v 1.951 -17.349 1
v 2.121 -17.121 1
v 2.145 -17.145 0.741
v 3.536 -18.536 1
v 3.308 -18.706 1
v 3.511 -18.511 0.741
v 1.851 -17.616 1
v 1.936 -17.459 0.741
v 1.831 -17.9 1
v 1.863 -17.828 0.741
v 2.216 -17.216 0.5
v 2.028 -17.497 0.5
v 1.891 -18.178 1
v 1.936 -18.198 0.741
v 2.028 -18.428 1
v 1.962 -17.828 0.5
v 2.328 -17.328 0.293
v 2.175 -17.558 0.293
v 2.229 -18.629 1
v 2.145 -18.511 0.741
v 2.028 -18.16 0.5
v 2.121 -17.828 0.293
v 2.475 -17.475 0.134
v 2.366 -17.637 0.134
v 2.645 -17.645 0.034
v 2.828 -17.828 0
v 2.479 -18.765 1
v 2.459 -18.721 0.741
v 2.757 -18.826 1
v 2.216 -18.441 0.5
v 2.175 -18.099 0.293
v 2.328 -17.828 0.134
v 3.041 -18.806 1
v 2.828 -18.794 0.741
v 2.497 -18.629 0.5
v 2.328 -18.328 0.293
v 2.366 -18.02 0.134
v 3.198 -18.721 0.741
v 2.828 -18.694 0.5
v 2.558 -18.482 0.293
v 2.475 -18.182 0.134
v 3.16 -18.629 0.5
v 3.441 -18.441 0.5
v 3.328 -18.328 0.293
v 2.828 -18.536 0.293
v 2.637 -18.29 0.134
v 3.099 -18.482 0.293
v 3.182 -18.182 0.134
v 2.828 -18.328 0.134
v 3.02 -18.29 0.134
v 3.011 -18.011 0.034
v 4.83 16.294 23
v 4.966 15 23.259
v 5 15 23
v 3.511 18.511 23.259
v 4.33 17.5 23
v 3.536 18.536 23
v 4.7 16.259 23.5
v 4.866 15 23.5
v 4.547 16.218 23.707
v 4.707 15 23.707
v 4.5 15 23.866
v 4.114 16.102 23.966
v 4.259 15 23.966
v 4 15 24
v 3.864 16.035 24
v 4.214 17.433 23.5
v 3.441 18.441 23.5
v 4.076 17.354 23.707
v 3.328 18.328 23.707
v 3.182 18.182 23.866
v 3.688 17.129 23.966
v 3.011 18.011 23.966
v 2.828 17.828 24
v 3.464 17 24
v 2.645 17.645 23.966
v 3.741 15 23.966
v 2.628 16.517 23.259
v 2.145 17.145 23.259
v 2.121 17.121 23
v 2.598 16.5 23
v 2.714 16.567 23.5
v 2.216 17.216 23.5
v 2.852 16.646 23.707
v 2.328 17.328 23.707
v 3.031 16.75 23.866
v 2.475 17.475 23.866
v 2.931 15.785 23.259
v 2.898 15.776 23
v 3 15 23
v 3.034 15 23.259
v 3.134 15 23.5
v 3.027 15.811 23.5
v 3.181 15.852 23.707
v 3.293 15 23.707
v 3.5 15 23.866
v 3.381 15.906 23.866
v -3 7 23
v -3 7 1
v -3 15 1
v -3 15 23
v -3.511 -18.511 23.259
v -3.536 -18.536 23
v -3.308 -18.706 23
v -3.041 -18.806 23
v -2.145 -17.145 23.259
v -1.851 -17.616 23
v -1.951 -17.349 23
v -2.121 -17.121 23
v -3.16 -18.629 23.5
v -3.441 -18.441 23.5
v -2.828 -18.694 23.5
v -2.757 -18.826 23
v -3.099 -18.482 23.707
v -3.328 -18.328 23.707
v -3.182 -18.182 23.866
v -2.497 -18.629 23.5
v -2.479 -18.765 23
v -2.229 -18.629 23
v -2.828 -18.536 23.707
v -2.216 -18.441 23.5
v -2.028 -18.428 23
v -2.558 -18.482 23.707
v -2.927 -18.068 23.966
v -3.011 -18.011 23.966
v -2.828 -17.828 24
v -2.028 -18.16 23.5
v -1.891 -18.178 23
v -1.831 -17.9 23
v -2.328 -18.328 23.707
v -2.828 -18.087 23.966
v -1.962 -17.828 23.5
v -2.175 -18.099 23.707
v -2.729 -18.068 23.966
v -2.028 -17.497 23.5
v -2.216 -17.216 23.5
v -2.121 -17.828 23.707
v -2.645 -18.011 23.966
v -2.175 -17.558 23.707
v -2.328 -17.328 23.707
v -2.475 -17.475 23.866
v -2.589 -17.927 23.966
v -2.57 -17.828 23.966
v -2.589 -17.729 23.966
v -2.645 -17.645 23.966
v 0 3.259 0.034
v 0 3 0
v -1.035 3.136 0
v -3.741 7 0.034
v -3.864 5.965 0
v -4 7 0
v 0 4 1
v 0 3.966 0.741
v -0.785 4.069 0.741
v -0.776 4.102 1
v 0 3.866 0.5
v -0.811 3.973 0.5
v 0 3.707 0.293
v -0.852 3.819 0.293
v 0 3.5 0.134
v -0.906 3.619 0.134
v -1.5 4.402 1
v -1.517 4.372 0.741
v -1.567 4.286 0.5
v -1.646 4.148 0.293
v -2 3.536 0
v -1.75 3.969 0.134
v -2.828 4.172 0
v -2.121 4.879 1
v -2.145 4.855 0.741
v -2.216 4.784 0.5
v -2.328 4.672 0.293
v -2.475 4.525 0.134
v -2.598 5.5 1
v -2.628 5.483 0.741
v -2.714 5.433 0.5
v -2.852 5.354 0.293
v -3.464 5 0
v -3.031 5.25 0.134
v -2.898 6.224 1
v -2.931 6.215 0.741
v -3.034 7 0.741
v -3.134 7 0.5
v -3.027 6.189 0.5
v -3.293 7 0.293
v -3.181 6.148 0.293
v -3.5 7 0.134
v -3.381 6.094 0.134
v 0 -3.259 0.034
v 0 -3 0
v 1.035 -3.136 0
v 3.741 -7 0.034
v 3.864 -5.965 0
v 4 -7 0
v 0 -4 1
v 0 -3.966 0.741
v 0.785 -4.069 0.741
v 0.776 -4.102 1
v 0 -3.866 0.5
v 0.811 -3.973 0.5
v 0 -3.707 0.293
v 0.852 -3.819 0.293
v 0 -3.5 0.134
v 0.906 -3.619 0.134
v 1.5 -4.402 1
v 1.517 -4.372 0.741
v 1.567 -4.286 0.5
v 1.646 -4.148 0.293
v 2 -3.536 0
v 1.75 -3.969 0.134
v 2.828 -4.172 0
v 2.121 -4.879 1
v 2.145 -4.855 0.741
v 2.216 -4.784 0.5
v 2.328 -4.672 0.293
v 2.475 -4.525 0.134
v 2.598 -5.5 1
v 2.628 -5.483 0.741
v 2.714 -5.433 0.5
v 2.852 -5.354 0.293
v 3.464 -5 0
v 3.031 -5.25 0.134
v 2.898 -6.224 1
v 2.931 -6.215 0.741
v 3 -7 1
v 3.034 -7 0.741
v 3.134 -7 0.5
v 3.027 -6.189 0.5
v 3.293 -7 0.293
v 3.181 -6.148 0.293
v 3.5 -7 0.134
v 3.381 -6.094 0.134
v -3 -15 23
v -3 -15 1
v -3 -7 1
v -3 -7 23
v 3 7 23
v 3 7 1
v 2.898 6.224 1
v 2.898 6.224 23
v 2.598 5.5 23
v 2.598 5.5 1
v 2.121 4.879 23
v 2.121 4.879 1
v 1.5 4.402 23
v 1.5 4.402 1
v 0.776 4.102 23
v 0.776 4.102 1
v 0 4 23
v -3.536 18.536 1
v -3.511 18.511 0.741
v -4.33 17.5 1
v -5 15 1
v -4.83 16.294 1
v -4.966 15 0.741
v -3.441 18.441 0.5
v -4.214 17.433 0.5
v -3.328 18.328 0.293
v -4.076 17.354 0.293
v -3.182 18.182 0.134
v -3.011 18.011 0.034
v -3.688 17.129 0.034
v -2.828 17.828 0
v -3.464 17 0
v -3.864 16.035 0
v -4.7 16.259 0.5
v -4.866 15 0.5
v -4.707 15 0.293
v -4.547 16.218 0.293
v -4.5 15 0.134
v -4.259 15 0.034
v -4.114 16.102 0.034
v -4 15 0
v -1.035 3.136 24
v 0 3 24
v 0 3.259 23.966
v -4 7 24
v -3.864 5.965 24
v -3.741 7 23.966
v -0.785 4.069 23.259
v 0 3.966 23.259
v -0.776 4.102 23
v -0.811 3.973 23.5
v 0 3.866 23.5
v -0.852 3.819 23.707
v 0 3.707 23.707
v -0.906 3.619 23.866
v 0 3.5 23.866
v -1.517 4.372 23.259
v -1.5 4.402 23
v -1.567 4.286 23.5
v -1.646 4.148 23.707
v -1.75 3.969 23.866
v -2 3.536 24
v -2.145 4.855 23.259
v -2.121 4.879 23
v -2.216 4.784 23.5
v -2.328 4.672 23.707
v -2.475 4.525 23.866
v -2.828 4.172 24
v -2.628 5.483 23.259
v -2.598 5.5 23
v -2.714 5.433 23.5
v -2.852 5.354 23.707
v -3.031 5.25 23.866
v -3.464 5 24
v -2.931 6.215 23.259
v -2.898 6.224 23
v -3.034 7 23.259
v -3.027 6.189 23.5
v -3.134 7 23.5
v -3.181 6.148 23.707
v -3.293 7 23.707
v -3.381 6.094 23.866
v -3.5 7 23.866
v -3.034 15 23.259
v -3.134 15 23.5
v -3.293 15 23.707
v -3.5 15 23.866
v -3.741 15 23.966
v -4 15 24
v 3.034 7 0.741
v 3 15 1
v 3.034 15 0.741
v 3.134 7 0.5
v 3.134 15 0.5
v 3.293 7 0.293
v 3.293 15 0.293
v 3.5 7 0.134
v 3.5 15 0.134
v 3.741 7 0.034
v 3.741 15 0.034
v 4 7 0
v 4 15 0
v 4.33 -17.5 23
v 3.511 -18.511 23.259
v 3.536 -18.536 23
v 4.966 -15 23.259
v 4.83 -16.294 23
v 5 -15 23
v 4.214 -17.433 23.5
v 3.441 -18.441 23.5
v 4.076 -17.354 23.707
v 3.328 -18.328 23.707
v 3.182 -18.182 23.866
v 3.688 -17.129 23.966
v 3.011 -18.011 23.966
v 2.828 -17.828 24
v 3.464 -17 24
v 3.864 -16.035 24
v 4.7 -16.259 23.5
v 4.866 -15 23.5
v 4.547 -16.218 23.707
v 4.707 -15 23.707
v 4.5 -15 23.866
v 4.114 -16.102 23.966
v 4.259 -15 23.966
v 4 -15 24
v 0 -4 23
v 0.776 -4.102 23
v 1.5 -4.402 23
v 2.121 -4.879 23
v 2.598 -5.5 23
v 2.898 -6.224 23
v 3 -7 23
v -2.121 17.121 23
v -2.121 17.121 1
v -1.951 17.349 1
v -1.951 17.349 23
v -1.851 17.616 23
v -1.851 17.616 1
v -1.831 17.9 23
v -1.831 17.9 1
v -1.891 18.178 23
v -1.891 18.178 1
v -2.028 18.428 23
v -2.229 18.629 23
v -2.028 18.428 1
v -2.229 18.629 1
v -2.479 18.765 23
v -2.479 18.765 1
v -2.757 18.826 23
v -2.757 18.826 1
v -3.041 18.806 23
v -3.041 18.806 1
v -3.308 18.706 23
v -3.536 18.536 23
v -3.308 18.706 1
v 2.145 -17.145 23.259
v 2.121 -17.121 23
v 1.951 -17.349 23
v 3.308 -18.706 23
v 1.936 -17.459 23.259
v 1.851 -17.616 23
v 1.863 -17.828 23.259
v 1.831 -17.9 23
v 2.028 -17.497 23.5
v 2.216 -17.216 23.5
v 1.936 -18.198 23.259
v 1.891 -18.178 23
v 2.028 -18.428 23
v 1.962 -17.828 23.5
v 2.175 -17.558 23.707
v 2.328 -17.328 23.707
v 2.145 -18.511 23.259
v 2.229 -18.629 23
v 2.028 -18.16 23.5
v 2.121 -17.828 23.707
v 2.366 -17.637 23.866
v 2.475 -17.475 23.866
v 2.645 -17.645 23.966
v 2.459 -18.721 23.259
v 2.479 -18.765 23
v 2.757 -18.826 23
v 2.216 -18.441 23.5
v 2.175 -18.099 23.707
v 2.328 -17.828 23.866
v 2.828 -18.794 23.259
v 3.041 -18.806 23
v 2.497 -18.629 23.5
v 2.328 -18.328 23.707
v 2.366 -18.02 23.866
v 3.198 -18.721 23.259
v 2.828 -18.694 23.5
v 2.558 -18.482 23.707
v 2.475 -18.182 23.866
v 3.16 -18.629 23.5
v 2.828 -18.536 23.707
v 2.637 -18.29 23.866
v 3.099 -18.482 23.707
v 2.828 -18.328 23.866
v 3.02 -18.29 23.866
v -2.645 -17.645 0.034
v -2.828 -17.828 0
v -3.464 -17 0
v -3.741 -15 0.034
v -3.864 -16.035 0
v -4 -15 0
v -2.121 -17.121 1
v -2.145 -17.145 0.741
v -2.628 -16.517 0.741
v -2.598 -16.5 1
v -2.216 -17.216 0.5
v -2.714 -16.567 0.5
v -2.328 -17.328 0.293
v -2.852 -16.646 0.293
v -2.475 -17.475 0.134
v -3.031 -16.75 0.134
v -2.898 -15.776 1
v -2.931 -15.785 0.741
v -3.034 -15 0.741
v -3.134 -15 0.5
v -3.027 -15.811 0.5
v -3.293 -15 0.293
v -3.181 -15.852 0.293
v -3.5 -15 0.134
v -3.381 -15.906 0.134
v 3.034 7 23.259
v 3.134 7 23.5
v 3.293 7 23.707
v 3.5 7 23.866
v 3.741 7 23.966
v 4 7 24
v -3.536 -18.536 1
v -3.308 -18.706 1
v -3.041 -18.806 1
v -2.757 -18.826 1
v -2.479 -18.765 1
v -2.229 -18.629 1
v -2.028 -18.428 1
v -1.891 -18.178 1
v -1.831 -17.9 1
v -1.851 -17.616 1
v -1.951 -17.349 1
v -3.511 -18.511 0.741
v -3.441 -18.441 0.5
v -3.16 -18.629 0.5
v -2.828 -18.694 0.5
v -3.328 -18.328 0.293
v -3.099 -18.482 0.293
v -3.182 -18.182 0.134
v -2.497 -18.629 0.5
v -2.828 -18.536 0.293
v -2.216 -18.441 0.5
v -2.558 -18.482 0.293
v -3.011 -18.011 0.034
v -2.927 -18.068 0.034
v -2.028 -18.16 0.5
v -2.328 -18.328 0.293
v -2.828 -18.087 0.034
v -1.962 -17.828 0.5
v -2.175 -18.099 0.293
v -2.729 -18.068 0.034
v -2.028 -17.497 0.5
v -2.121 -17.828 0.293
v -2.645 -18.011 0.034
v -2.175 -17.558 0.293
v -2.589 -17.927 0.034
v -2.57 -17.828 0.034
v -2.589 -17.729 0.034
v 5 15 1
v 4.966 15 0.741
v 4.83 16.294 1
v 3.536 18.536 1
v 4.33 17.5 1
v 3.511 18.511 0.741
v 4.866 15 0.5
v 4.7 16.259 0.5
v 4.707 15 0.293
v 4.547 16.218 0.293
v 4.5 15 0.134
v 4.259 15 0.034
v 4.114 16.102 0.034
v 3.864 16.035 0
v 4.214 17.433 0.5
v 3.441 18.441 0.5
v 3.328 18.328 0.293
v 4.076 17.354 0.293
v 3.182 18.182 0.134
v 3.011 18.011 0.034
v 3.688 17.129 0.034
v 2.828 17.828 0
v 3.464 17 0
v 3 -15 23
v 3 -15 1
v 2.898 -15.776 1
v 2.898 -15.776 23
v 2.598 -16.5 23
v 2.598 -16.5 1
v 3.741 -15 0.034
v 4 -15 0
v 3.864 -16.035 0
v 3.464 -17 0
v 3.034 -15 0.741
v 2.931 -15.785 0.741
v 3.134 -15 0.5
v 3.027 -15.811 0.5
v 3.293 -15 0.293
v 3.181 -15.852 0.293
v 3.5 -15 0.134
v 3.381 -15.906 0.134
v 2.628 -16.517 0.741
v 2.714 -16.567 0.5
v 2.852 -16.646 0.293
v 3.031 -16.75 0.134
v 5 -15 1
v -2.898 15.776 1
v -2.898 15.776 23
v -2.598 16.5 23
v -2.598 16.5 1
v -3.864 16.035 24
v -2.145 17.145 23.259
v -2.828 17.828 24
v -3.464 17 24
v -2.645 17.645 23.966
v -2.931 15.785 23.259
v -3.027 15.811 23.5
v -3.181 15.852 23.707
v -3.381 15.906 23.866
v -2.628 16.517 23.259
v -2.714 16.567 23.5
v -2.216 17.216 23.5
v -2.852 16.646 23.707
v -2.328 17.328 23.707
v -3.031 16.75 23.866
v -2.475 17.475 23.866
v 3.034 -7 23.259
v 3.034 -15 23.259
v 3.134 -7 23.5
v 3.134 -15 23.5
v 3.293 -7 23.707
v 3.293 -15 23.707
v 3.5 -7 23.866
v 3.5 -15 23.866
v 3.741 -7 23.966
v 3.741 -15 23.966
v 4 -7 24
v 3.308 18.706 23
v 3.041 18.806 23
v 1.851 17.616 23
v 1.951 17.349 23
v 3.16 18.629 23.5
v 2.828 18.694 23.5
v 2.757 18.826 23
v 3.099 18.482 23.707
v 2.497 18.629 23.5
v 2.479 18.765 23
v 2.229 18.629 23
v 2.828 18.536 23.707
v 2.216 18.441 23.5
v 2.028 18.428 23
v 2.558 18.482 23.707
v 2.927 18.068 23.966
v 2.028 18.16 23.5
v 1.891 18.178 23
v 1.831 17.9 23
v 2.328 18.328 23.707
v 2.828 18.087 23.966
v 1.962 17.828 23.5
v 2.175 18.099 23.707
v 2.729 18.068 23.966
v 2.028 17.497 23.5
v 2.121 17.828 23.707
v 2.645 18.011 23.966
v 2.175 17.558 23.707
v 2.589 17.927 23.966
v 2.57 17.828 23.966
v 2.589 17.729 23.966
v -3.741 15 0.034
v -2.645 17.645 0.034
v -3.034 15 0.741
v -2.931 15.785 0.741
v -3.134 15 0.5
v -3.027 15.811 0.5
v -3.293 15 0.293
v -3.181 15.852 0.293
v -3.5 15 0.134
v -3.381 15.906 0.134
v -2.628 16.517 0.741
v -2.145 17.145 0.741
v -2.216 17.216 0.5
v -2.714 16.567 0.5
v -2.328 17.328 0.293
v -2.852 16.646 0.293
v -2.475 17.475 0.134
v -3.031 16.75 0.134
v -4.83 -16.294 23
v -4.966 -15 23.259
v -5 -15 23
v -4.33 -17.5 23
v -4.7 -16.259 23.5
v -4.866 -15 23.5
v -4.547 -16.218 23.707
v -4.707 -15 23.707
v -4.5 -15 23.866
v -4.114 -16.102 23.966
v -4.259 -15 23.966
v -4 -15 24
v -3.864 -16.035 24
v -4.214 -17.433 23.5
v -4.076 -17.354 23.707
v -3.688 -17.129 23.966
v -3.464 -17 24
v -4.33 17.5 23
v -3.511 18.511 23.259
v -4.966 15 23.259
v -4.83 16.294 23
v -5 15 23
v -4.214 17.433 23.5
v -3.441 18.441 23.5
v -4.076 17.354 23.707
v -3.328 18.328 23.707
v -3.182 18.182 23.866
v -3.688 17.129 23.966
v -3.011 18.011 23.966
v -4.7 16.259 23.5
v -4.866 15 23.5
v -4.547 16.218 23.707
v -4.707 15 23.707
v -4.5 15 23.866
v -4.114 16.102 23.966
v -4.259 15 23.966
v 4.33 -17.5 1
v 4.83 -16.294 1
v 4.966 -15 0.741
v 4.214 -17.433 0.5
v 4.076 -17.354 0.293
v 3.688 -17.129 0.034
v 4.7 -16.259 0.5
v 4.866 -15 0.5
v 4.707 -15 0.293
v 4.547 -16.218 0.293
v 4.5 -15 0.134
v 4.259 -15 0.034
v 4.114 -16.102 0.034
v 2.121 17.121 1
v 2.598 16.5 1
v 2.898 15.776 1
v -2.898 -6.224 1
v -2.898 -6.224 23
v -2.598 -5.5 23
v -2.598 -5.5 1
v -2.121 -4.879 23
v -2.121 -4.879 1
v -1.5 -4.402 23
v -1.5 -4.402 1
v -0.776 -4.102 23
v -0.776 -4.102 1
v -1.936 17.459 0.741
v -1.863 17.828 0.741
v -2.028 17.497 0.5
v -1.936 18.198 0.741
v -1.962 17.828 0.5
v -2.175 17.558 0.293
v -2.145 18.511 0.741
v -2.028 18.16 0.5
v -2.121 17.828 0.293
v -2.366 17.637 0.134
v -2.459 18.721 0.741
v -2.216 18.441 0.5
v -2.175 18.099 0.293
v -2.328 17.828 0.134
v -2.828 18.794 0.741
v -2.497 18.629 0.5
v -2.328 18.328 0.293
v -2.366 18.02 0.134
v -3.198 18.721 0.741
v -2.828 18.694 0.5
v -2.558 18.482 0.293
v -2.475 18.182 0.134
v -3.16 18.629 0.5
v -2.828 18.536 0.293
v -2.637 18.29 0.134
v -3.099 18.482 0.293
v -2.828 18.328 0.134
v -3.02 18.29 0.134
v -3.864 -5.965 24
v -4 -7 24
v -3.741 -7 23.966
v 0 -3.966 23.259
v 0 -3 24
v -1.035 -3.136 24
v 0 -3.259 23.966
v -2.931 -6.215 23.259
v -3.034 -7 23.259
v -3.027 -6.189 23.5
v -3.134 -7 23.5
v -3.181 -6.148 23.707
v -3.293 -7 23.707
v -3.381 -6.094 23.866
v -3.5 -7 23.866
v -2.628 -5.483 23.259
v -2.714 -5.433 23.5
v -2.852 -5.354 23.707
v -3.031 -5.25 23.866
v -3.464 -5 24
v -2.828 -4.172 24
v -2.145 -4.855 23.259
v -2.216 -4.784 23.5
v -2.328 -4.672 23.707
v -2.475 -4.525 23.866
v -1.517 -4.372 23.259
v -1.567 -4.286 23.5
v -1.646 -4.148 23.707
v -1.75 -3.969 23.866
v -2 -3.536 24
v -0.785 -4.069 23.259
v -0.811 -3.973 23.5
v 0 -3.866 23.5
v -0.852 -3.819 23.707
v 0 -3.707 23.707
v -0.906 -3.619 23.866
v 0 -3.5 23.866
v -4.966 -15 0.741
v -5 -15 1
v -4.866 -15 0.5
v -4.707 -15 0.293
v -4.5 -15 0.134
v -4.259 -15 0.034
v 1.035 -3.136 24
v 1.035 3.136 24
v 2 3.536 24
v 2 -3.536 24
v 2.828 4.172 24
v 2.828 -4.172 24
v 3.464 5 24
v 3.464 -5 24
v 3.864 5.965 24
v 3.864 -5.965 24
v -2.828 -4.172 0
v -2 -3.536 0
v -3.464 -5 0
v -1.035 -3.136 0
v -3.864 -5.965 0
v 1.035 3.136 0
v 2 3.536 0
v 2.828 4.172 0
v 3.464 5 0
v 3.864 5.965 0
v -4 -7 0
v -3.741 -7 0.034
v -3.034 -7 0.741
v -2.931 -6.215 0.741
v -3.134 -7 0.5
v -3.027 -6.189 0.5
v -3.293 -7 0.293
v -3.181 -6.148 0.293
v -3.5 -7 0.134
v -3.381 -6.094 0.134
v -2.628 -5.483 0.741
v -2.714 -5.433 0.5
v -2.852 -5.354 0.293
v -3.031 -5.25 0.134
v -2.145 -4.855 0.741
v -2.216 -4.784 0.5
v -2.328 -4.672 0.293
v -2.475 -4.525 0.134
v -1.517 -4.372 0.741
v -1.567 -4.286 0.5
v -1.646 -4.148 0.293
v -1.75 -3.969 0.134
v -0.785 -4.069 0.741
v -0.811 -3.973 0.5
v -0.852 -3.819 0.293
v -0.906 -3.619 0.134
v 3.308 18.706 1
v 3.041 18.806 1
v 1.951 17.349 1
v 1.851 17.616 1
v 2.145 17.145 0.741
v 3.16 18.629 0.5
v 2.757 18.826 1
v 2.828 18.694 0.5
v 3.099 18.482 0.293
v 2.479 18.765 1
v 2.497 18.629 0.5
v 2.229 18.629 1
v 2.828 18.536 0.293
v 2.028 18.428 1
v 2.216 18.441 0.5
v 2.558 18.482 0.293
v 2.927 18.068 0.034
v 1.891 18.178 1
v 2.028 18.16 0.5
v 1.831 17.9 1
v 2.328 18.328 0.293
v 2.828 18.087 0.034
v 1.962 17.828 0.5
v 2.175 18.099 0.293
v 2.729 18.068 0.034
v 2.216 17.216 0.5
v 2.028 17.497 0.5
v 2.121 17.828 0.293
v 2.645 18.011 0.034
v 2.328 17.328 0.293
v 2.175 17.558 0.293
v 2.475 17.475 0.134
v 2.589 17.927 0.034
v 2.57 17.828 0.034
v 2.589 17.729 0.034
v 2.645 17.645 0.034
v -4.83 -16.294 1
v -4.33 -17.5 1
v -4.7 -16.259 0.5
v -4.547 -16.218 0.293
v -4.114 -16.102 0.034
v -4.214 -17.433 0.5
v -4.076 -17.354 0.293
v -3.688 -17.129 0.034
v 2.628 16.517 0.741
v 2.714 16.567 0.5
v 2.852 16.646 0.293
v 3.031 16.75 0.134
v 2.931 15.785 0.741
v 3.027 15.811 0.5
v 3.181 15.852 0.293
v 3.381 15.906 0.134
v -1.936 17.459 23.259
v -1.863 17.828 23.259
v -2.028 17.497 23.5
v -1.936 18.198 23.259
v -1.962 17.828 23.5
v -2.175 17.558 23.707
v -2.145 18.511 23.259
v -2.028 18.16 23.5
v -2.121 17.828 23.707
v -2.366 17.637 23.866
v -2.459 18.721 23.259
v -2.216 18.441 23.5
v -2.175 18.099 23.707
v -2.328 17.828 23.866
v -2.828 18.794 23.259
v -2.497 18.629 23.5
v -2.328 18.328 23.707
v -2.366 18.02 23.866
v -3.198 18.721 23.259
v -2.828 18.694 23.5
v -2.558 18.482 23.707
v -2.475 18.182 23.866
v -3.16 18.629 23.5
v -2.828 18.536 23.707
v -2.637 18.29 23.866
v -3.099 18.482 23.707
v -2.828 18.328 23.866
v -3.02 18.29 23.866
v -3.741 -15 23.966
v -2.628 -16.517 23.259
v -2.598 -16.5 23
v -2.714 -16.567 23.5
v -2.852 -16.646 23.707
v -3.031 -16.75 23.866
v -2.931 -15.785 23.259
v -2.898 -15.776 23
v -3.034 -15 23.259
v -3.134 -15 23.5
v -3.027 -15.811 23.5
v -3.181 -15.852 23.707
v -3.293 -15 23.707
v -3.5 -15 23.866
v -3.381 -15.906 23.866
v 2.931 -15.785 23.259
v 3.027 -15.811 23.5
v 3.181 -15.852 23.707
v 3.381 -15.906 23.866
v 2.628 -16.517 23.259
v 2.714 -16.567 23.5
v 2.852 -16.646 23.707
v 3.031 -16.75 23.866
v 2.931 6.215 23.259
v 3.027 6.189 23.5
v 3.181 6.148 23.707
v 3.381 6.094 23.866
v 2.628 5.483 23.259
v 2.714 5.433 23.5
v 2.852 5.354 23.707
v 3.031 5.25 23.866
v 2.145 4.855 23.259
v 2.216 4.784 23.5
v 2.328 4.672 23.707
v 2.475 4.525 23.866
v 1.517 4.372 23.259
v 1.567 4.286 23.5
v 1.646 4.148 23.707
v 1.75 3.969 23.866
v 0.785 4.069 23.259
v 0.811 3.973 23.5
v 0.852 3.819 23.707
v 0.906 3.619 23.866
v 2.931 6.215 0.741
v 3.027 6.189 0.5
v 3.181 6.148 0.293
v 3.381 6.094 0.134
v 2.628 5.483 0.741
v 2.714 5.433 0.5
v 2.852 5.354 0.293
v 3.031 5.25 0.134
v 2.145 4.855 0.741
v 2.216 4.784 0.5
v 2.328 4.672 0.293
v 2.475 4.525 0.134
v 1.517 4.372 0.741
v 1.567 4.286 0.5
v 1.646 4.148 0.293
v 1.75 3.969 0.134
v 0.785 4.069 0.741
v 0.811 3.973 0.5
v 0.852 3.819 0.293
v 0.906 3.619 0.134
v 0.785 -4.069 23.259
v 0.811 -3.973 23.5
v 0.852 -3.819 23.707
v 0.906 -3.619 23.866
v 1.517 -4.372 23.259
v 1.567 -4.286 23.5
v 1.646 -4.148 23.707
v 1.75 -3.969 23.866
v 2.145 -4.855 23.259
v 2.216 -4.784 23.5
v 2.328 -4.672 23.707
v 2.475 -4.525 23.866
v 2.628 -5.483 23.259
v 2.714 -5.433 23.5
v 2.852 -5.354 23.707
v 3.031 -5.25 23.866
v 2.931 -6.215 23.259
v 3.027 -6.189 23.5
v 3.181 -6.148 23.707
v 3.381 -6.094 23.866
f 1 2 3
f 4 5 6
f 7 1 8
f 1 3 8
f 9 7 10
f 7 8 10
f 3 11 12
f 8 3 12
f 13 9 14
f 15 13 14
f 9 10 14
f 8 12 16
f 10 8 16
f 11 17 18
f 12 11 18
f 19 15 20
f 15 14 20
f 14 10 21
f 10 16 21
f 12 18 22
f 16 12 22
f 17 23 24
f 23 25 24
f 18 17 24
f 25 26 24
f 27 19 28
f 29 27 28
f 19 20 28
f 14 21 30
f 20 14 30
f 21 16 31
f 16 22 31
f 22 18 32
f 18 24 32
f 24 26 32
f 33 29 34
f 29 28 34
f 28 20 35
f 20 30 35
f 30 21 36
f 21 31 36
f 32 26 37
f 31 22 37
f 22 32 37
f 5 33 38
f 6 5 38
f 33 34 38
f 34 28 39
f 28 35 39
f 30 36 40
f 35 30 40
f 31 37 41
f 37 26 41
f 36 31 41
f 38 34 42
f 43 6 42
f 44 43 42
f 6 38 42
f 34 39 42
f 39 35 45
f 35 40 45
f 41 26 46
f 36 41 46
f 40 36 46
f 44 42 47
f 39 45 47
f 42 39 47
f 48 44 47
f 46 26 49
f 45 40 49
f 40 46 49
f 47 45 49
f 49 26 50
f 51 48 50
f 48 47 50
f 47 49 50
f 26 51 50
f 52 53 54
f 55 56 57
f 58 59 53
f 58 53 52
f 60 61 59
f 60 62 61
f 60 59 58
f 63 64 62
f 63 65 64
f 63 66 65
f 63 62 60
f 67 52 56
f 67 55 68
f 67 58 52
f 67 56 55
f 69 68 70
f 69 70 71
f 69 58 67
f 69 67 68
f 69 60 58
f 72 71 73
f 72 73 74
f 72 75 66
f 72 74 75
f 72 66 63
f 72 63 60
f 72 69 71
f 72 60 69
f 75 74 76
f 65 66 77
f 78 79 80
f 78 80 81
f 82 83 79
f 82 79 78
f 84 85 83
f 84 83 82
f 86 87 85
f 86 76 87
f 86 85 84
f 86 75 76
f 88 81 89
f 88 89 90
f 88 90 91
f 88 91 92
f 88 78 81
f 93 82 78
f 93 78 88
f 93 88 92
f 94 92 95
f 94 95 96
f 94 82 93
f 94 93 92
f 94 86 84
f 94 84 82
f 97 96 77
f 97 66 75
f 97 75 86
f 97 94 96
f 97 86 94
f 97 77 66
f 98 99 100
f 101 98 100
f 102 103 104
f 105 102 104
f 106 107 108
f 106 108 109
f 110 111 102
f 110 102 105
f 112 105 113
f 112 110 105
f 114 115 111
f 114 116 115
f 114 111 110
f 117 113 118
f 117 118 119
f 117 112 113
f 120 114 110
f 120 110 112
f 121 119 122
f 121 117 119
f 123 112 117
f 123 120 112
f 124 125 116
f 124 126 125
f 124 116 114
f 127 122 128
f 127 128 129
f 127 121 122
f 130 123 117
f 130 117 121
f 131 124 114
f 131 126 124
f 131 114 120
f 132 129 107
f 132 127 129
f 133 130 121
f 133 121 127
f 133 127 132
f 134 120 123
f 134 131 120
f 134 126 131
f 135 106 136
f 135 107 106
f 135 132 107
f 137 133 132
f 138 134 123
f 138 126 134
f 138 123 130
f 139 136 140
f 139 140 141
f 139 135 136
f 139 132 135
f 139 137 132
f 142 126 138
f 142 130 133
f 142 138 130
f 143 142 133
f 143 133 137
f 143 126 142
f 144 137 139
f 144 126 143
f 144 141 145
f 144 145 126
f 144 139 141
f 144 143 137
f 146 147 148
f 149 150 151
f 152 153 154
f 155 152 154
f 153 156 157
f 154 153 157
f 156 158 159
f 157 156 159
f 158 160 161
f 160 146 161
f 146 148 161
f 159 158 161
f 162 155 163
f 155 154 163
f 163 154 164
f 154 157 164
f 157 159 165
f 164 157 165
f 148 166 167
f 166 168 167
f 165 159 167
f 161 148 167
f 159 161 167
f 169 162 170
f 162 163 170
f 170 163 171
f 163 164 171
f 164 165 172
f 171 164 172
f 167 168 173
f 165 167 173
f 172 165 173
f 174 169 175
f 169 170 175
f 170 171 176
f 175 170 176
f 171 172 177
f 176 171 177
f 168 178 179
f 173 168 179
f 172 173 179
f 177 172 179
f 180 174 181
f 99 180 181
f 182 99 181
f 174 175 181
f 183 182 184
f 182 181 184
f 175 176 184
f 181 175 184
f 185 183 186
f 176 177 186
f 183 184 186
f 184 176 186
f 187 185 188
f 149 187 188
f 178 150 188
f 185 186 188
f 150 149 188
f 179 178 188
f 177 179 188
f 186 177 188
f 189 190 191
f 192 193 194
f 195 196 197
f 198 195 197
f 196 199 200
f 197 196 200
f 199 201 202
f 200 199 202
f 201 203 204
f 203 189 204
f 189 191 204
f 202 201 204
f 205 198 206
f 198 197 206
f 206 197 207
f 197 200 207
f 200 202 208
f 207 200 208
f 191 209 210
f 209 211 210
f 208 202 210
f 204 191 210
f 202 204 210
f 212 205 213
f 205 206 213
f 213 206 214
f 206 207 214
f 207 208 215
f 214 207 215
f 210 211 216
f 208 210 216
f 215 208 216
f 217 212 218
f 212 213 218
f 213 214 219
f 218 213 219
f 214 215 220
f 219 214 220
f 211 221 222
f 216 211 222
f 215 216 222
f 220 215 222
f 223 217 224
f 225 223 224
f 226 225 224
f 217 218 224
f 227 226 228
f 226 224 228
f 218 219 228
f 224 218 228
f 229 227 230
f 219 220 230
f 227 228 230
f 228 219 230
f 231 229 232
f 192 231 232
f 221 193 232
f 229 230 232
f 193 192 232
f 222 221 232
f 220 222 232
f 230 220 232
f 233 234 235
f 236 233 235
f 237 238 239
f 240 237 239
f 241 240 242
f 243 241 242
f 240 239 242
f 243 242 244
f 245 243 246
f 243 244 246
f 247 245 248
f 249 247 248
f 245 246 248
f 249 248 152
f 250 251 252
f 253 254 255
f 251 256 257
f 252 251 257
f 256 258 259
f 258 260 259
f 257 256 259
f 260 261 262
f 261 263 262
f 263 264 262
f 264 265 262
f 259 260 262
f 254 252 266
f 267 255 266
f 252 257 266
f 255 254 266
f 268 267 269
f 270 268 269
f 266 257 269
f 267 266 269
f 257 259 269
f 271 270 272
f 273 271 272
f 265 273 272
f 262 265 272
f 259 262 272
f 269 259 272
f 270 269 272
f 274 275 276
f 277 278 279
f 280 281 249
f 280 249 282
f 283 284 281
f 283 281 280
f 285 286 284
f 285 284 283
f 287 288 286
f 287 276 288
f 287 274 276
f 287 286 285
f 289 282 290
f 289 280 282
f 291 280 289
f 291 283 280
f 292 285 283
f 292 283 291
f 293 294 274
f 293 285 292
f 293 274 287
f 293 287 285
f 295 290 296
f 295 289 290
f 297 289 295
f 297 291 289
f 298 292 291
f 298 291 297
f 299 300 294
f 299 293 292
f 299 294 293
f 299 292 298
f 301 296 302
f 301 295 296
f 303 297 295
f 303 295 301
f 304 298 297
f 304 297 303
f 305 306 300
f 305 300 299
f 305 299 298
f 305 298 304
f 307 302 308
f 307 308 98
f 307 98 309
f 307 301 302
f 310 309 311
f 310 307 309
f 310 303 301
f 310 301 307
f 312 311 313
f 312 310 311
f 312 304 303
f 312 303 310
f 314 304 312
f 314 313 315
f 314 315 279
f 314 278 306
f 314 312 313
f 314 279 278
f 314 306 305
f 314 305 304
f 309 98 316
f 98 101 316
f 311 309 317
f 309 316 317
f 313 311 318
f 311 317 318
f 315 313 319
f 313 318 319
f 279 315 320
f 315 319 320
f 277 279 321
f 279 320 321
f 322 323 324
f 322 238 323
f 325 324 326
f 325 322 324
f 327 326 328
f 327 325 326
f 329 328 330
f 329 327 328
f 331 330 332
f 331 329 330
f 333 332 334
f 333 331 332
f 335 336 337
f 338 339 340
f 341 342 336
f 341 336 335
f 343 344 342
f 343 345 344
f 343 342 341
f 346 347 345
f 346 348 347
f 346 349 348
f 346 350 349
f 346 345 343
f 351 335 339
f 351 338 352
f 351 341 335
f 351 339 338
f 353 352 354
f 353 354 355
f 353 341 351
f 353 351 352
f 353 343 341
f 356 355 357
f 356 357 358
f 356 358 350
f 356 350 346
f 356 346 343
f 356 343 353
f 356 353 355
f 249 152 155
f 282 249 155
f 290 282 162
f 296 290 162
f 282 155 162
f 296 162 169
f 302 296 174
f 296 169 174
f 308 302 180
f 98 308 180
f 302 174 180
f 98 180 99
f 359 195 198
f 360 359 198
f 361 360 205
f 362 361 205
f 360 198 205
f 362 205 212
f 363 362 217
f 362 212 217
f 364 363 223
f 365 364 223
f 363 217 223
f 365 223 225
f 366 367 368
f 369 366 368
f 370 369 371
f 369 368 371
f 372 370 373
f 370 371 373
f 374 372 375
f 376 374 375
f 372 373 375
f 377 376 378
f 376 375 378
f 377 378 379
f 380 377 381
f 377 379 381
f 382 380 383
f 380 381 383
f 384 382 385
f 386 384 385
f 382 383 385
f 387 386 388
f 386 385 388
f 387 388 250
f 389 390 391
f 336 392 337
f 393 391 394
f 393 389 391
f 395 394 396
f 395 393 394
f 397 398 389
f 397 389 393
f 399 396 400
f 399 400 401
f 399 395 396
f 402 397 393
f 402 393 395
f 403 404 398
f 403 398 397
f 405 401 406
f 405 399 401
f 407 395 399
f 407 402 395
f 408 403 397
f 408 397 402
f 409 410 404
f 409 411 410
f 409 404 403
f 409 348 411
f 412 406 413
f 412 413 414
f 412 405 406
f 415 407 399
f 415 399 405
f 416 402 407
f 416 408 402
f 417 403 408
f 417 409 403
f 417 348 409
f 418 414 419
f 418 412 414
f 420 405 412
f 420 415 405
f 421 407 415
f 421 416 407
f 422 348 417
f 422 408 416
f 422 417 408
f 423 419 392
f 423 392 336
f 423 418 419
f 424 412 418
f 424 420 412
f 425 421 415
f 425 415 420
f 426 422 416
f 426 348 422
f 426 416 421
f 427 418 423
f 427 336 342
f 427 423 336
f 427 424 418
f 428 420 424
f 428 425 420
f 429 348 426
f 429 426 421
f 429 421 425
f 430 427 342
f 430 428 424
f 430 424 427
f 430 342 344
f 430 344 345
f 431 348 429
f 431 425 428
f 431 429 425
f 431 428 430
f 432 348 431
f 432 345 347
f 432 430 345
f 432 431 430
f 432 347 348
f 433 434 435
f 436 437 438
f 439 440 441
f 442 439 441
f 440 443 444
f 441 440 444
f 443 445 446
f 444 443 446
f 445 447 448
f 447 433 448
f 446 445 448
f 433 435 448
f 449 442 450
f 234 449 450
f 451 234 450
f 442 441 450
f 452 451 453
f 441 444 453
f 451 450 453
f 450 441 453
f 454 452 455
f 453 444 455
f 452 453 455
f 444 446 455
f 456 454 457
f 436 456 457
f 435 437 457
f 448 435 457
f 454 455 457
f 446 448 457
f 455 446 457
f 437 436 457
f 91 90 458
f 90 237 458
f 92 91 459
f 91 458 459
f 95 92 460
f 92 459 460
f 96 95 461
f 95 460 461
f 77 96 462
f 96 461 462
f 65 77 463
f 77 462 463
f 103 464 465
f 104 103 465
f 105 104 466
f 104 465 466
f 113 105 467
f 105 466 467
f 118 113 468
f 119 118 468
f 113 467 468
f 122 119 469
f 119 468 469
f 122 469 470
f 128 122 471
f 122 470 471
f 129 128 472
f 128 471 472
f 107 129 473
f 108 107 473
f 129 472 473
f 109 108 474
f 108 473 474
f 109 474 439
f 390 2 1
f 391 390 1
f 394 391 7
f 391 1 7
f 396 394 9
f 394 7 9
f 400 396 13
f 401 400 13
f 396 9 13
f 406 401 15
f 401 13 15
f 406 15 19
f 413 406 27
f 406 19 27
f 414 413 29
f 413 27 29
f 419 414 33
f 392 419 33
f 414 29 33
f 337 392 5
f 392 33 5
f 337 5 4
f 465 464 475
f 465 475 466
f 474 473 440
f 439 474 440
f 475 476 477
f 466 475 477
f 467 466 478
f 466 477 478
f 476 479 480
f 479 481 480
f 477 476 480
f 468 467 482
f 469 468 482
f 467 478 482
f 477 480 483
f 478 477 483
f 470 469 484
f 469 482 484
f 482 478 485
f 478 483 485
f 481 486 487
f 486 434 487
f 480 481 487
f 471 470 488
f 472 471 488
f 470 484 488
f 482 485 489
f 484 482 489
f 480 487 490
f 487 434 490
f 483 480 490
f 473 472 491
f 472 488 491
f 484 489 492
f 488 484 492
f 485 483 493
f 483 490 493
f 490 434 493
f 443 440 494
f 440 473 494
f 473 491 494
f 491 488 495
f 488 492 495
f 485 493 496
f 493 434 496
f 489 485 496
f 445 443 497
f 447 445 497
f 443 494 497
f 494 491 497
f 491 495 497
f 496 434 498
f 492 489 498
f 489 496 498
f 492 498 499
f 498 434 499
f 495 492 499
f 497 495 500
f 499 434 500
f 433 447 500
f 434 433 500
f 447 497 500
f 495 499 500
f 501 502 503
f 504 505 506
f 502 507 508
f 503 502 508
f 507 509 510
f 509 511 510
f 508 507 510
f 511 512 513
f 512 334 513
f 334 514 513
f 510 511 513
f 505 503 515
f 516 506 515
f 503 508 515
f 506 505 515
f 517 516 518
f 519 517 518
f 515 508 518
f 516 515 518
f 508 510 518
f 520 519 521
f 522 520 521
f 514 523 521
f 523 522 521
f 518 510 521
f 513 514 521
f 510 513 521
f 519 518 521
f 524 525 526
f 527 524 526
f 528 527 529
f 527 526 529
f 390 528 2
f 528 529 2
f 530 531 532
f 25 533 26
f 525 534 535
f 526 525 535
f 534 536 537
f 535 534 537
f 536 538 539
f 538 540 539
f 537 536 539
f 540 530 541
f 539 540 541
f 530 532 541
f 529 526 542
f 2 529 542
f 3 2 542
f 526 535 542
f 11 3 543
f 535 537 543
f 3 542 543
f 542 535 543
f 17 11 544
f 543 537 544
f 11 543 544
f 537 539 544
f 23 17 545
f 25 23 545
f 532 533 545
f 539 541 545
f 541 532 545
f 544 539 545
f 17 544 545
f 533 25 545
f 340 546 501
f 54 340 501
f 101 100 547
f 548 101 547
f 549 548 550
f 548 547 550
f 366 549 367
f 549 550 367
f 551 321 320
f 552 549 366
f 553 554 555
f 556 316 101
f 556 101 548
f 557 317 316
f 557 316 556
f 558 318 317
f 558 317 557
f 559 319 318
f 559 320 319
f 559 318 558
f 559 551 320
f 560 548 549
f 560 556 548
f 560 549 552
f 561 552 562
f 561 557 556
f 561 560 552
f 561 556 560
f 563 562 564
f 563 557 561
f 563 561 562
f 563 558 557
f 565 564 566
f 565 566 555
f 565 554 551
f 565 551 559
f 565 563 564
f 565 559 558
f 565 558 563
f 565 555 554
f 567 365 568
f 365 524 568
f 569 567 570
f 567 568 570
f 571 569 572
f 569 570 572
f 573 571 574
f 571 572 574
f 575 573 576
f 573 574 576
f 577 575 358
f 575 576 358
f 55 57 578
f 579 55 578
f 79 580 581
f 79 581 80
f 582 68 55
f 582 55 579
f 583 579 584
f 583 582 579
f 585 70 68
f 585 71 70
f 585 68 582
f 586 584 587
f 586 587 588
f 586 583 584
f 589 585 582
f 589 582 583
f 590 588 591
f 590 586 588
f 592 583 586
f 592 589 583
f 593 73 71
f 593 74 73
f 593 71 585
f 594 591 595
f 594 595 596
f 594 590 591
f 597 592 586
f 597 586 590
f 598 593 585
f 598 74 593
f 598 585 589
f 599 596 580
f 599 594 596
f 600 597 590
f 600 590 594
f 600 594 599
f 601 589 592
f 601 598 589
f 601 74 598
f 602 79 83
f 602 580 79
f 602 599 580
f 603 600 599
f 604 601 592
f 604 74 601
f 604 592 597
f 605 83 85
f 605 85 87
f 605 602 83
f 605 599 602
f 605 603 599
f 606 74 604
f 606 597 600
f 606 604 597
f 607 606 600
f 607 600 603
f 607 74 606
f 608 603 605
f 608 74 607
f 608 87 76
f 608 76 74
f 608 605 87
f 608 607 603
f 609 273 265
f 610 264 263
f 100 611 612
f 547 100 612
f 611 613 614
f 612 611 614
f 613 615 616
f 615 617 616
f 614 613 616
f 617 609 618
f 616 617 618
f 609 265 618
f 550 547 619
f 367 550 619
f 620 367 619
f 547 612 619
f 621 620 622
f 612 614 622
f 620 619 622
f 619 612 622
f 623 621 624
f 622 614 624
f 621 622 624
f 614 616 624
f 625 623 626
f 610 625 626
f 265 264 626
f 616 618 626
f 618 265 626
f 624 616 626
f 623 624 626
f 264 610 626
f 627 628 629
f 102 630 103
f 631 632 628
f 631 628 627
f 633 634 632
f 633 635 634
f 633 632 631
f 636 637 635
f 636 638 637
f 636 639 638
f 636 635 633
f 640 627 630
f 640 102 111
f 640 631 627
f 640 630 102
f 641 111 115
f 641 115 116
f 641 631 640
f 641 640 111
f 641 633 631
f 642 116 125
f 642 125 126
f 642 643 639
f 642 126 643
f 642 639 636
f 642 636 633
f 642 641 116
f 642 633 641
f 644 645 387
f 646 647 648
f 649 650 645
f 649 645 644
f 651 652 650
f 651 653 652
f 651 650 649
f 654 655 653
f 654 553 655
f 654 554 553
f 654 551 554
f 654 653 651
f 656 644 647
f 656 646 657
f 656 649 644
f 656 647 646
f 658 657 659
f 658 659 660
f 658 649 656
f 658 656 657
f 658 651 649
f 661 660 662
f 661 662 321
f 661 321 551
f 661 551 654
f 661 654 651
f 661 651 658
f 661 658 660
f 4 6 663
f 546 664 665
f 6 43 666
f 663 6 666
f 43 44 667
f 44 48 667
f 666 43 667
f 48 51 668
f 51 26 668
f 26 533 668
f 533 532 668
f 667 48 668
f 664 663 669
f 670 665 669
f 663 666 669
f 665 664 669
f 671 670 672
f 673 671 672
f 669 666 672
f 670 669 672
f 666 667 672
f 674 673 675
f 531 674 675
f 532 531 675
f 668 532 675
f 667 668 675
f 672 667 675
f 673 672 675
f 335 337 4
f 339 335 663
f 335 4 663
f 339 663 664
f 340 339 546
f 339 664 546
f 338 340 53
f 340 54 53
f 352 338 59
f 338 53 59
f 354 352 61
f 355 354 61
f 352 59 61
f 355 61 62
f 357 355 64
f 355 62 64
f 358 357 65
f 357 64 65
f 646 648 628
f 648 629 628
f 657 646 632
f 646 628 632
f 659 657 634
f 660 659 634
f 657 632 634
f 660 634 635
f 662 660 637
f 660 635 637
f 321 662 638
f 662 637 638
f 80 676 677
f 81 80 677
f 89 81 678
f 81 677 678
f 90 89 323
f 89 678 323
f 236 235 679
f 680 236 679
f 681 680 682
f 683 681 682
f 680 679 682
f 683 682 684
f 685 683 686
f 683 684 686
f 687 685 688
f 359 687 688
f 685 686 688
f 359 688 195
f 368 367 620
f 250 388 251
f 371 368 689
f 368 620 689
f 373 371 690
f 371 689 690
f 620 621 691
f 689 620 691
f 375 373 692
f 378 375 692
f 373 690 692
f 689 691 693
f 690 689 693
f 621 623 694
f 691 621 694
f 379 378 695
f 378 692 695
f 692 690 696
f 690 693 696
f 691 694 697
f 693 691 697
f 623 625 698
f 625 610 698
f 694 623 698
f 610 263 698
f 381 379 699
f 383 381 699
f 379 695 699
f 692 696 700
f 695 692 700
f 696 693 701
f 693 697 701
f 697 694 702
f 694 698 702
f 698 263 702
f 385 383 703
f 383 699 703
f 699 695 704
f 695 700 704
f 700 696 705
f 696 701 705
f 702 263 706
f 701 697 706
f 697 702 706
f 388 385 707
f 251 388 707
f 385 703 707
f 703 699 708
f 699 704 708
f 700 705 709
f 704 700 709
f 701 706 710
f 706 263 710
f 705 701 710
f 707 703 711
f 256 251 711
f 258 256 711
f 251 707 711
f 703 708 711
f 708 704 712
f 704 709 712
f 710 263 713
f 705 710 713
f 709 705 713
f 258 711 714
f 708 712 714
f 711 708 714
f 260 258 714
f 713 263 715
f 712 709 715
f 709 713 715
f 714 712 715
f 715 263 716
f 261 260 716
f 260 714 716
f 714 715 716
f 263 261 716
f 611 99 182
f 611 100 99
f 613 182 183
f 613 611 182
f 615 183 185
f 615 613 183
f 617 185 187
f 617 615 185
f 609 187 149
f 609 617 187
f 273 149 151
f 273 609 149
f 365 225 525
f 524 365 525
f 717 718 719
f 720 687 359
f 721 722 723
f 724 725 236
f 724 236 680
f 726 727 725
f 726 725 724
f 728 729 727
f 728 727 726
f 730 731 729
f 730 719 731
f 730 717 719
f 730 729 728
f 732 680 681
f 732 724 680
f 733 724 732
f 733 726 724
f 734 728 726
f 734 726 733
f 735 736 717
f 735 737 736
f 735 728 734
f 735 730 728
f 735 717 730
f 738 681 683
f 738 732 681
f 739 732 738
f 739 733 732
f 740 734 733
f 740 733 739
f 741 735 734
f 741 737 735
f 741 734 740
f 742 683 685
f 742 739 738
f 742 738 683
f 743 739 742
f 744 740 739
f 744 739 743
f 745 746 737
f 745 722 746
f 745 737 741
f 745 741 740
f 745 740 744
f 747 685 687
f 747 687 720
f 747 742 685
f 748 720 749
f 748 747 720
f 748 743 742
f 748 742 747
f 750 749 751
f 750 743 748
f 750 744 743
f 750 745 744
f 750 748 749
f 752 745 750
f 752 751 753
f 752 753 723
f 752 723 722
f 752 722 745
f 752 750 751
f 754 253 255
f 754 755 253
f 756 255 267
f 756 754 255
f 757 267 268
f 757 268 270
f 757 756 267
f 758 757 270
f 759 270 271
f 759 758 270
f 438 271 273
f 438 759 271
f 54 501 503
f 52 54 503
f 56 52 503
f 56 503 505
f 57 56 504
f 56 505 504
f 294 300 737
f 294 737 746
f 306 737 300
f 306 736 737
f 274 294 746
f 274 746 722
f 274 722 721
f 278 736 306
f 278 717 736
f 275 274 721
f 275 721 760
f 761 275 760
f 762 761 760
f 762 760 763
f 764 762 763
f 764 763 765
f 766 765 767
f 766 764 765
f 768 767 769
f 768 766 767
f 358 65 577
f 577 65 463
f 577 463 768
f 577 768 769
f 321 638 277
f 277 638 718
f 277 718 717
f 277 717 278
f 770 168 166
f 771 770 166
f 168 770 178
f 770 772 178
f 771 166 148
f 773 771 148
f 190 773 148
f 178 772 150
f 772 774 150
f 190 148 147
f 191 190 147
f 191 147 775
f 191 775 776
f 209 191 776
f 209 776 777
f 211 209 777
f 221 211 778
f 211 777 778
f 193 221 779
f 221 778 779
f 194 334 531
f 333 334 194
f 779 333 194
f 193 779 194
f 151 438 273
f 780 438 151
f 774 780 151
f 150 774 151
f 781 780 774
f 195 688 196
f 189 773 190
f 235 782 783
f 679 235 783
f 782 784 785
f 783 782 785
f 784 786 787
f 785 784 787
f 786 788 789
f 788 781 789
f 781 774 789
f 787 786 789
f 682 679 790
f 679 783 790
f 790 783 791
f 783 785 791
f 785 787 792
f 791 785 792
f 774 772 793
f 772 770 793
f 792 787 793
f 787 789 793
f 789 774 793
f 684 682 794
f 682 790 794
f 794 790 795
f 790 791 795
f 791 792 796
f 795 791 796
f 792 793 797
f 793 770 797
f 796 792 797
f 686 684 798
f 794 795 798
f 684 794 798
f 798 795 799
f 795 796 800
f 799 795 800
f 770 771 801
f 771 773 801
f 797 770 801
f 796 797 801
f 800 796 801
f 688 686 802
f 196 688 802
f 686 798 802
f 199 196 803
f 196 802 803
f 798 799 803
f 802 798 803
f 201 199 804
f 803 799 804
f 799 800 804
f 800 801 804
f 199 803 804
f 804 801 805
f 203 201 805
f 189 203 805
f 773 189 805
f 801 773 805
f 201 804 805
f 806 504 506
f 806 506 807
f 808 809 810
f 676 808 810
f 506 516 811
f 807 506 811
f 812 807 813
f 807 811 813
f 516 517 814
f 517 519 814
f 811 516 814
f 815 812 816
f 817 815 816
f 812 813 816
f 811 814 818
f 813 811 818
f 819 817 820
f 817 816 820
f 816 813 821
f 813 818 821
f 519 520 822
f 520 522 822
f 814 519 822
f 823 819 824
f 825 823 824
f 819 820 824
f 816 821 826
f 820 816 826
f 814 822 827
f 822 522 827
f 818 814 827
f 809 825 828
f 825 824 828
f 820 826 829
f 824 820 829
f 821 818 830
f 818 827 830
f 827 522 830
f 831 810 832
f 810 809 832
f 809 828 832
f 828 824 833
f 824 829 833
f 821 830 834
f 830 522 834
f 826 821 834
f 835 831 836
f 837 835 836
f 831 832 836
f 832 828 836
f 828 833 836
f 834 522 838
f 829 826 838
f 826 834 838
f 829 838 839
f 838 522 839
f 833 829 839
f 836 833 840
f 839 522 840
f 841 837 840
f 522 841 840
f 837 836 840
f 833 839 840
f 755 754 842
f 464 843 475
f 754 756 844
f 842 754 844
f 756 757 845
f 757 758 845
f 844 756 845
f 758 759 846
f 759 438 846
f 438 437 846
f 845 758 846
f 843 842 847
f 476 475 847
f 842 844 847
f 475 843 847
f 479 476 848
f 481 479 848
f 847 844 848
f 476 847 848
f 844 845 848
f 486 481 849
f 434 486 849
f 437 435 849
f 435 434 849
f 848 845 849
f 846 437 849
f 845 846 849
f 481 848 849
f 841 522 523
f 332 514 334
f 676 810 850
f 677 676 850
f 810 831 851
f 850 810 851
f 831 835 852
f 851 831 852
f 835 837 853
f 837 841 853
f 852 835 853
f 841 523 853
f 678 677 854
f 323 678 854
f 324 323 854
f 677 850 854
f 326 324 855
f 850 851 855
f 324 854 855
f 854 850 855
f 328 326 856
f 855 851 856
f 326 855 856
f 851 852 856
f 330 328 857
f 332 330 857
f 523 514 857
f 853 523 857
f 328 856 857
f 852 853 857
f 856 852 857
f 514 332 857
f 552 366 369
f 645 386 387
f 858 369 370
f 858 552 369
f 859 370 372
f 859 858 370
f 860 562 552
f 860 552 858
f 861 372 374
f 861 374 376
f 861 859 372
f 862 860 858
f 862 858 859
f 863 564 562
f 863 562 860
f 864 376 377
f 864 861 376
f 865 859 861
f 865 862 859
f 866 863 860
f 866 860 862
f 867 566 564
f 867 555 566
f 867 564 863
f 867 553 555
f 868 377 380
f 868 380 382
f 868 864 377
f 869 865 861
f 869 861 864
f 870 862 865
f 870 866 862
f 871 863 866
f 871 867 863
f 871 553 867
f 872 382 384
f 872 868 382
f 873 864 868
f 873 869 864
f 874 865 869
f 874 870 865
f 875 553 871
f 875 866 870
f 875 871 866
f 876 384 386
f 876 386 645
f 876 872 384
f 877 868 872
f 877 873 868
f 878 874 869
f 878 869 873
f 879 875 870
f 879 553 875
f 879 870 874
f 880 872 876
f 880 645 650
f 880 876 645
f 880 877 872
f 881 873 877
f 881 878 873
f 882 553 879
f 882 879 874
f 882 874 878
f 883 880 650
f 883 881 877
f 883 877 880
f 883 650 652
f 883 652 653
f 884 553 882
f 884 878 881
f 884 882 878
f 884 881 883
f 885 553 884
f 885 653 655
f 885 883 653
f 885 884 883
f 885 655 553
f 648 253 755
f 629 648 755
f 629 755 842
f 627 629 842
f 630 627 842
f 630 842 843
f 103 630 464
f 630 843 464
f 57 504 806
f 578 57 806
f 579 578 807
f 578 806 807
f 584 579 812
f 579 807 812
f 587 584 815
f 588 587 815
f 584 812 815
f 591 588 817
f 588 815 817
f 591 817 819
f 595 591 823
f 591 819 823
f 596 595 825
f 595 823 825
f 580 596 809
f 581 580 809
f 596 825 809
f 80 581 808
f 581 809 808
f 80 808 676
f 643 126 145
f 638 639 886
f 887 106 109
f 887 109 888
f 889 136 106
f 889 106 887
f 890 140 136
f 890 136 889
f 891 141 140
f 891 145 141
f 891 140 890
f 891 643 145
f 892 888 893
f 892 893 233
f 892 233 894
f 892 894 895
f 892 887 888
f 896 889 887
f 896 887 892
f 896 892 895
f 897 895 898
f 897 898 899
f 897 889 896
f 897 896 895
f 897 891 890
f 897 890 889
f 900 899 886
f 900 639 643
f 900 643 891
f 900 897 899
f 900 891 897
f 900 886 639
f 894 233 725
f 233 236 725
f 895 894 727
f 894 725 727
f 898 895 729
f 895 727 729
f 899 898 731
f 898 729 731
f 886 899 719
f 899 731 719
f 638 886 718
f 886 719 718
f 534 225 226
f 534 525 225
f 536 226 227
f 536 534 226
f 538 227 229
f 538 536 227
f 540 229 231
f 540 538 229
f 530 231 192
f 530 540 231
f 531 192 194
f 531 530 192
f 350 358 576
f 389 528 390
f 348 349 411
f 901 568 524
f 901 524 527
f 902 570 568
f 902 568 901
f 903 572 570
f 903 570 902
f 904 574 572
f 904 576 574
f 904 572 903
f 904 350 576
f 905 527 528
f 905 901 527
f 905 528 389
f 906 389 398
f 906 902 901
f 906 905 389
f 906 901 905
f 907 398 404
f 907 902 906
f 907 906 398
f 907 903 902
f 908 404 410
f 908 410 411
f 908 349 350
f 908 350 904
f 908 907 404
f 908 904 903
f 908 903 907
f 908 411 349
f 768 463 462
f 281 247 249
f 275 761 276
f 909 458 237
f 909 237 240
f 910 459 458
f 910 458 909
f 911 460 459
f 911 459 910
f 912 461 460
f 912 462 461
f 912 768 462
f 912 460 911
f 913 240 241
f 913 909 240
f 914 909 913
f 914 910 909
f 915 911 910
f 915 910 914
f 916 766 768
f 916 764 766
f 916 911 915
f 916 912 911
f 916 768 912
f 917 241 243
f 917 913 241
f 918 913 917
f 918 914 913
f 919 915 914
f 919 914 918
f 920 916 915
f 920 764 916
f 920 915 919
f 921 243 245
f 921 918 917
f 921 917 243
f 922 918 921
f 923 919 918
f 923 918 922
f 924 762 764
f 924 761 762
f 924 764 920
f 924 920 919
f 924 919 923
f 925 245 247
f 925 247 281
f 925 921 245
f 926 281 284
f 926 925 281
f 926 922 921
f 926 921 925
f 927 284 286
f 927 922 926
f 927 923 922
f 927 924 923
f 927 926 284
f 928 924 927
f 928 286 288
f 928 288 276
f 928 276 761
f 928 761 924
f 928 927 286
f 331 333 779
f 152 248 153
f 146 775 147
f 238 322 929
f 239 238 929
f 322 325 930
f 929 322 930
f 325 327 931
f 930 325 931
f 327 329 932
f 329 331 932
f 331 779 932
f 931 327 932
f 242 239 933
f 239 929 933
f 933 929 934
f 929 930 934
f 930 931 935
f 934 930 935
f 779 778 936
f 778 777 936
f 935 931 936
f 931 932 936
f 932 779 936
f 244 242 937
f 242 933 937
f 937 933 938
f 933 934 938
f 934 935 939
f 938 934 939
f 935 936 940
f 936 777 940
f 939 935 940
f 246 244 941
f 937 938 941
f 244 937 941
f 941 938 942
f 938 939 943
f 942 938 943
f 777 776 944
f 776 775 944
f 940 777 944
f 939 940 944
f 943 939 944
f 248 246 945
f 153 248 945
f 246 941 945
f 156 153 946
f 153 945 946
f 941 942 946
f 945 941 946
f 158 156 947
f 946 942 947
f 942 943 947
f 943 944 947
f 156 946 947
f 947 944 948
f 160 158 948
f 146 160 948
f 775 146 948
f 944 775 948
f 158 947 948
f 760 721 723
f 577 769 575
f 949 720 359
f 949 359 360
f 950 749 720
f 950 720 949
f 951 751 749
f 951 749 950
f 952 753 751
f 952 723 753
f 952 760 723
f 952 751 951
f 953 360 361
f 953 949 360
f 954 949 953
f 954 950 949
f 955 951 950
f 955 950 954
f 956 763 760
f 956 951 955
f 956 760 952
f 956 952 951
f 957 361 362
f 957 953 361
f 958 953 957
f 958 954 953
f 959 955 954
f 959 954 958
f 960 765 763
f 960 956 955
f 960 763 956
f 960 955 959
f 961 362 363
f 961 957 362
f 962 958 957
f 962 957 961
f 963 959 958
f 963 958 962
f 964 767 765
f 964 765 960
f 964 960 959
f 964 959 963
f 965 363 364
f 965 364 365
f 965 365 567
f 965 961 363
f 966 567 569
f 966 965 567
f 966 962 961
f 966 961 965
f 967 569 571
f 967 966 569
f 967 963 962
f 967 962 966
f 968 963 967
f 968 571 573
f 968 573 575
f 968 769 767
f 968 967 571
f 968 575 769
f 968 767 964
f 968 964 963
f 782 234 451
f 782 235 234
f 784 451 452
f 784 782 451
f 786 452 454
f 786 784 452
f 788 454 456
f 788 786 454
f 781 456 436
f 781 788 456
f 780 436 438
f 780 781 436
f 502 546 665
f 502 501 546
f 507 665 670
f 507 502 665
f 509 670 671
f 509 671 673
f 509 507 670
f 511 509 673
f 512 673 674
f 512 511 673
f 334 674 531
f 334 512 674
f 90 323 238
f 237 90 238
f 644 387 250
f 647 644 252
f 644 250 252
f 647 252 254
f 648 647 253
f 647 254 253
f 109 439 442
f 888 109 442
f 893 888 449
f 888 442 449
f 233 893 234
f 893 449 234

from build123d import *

# Parameters (mm, degrees)
F2_DEPTH = 24
F3_R     = 0.99999


# Not quite as in the source:
# - a fillet or chamfer is up to 0.001 mm smaller than in the source, because OpenCascade refuses the exact size


with BuildPart() as f2:
    # F0 (on Top) → F2 (new body)
    with BuildSketch(Plane.XY):
        with BuildLine():
            ThreePointArc((-2.1213203436, 17.1213203436), (-2.1213203436, 18.5355339059), (-3.5355339059, 18.5355339059))
            ThreePointArc((-3.5355339059, 18.5355339059), (-4.6193976626, 16.9134171618), (-5, 15))
            Line((-5, 15), (-5, 0))
            Line((-5, 0), (-5, -15))
            ThreePointArc((-5, -15), (-4.6193976626, -16.9134171618), (-3.5355339059, -18.5355339059))
            ThreePointArc((-3.5355339059, -18.5355339059), (-2.1213203436, -18.5355339059), (-2.1213203436, -17.1213203436))
            ThreePointArc((-2.1213203436, -17.1213203436), (-2.7716385975, -16.1480502971), (-3, -15))
            Line((-3, -15), (-3, -7))
            ThreePointArc((-3, -7), (-2.1213203436, -4.8786796564), (0, -4))
            ThreePointArc((0, -4), (2.1213203436, -4.8786796564), (3, -7))
            Line((3, -7), (3, -15))
            ThreePointArc((3, -15), (2.7716385975, -16.1480502971), (2.1213203436, -17.1213203436))
            ThreePointArc((2.1213203436, -17.1213203436), (2.1213203436, -18.5355339059), (3.5355339059, -18.5355339059))
            ThreePointArc((3.5355339059, -18.5355339059), (4.6193976626, -16.9134171618), (5, -15))
            Line((5, -15), (5, 0))
            Line((5, 0), (5, 15))
            ThreePointArc((5, 15), (4.6193976626, 16.9134171618), (3.5355339059, 18.5355339059))
            ThreePointArc((3.5355339059, 18.5355339059), (2.1213203436, 18.5355339059), (2.1213203436, 17.1213203436))
            ThreePointArc((2.1213203436, 17.1213203436), (2.7716385975, 16.1480502971), (3, 15))
            Line((3, 15), (3, 7))
            ThreePointArc((3, 7), (2.1213203436, 4.8786796564), (0, 4))
            ThreePointArc((0, 4), (-2.1213203436, 4.8786796564), (-3, 7))
            Line((-3, 7), (-3, 15))
            ThreePointArc((-3, 15), (-2.7716385975, 16.1480502971), (-2.1213203436, 17.1213203436))
        make_face()
    extrude(amount=F2_DEPTH)

    # F3 (radius 1 in the source; OpenCascade refuses exactly that, so slightly less here)
    f3_edges = [f2.edges().sort_by_distance(p)[0] for p in [
        (5, 0, 24),
        (4.619398, 16.913417, 24),
        (2.12132, 18.535534, 24),
        (2.771639, 16.14805, 24),
        (3, 11, 24),
        (0, 4, 24),
        (-3, 11, 24),
        (-2.771639, 16.14805, 24),
        (-2.12132, 18.535534, 24),
        (-4.619398, 16.913417, 24),
        (-5, 0, 24),
        (-4.619398, -16.913417, 24),
        (-2.12132, -18.535534, 24),
        (-2.771639, -16.14805, 24),
        (-3, -11, 24),
        (0, -4, 24),
        (3, -11, 24),
        (2.771639, -16.14805, 24),
        (2.12132, -18.535534, 24),
        (4.619398, -16.913417, 24),
        (5, 0, 0),
        (4.619398, 16.913417, 0),
        (2.12132, 18.535534, 0),
        (2.771639, 16.14805, 0),
        (3, 11, 0),
        (0, 4, 0),
        (-3, 11, 0),
        (-2.771639, 16.14805, 0),
        (-2.12132, 18.535534, 0),
        (-4.619398, 16.913417, 0),
        (-5, 0, 0),
        (-4.619398, -16.913417, 0),
        (-2.12132, -18.535534, 0),
        (-2.771639, -16.14805, 0),
        (-3, -11, 0),
        (0, -4, 0),
        (3, -11, 0),
        (2.771639, -16.14805, 0),
        (2.12132, -18.535534, 0),
        (4.619398, -16.913417, 0),
    ]]
    fillet(f3_edges, radius=F3_R)


solid = f2.part
